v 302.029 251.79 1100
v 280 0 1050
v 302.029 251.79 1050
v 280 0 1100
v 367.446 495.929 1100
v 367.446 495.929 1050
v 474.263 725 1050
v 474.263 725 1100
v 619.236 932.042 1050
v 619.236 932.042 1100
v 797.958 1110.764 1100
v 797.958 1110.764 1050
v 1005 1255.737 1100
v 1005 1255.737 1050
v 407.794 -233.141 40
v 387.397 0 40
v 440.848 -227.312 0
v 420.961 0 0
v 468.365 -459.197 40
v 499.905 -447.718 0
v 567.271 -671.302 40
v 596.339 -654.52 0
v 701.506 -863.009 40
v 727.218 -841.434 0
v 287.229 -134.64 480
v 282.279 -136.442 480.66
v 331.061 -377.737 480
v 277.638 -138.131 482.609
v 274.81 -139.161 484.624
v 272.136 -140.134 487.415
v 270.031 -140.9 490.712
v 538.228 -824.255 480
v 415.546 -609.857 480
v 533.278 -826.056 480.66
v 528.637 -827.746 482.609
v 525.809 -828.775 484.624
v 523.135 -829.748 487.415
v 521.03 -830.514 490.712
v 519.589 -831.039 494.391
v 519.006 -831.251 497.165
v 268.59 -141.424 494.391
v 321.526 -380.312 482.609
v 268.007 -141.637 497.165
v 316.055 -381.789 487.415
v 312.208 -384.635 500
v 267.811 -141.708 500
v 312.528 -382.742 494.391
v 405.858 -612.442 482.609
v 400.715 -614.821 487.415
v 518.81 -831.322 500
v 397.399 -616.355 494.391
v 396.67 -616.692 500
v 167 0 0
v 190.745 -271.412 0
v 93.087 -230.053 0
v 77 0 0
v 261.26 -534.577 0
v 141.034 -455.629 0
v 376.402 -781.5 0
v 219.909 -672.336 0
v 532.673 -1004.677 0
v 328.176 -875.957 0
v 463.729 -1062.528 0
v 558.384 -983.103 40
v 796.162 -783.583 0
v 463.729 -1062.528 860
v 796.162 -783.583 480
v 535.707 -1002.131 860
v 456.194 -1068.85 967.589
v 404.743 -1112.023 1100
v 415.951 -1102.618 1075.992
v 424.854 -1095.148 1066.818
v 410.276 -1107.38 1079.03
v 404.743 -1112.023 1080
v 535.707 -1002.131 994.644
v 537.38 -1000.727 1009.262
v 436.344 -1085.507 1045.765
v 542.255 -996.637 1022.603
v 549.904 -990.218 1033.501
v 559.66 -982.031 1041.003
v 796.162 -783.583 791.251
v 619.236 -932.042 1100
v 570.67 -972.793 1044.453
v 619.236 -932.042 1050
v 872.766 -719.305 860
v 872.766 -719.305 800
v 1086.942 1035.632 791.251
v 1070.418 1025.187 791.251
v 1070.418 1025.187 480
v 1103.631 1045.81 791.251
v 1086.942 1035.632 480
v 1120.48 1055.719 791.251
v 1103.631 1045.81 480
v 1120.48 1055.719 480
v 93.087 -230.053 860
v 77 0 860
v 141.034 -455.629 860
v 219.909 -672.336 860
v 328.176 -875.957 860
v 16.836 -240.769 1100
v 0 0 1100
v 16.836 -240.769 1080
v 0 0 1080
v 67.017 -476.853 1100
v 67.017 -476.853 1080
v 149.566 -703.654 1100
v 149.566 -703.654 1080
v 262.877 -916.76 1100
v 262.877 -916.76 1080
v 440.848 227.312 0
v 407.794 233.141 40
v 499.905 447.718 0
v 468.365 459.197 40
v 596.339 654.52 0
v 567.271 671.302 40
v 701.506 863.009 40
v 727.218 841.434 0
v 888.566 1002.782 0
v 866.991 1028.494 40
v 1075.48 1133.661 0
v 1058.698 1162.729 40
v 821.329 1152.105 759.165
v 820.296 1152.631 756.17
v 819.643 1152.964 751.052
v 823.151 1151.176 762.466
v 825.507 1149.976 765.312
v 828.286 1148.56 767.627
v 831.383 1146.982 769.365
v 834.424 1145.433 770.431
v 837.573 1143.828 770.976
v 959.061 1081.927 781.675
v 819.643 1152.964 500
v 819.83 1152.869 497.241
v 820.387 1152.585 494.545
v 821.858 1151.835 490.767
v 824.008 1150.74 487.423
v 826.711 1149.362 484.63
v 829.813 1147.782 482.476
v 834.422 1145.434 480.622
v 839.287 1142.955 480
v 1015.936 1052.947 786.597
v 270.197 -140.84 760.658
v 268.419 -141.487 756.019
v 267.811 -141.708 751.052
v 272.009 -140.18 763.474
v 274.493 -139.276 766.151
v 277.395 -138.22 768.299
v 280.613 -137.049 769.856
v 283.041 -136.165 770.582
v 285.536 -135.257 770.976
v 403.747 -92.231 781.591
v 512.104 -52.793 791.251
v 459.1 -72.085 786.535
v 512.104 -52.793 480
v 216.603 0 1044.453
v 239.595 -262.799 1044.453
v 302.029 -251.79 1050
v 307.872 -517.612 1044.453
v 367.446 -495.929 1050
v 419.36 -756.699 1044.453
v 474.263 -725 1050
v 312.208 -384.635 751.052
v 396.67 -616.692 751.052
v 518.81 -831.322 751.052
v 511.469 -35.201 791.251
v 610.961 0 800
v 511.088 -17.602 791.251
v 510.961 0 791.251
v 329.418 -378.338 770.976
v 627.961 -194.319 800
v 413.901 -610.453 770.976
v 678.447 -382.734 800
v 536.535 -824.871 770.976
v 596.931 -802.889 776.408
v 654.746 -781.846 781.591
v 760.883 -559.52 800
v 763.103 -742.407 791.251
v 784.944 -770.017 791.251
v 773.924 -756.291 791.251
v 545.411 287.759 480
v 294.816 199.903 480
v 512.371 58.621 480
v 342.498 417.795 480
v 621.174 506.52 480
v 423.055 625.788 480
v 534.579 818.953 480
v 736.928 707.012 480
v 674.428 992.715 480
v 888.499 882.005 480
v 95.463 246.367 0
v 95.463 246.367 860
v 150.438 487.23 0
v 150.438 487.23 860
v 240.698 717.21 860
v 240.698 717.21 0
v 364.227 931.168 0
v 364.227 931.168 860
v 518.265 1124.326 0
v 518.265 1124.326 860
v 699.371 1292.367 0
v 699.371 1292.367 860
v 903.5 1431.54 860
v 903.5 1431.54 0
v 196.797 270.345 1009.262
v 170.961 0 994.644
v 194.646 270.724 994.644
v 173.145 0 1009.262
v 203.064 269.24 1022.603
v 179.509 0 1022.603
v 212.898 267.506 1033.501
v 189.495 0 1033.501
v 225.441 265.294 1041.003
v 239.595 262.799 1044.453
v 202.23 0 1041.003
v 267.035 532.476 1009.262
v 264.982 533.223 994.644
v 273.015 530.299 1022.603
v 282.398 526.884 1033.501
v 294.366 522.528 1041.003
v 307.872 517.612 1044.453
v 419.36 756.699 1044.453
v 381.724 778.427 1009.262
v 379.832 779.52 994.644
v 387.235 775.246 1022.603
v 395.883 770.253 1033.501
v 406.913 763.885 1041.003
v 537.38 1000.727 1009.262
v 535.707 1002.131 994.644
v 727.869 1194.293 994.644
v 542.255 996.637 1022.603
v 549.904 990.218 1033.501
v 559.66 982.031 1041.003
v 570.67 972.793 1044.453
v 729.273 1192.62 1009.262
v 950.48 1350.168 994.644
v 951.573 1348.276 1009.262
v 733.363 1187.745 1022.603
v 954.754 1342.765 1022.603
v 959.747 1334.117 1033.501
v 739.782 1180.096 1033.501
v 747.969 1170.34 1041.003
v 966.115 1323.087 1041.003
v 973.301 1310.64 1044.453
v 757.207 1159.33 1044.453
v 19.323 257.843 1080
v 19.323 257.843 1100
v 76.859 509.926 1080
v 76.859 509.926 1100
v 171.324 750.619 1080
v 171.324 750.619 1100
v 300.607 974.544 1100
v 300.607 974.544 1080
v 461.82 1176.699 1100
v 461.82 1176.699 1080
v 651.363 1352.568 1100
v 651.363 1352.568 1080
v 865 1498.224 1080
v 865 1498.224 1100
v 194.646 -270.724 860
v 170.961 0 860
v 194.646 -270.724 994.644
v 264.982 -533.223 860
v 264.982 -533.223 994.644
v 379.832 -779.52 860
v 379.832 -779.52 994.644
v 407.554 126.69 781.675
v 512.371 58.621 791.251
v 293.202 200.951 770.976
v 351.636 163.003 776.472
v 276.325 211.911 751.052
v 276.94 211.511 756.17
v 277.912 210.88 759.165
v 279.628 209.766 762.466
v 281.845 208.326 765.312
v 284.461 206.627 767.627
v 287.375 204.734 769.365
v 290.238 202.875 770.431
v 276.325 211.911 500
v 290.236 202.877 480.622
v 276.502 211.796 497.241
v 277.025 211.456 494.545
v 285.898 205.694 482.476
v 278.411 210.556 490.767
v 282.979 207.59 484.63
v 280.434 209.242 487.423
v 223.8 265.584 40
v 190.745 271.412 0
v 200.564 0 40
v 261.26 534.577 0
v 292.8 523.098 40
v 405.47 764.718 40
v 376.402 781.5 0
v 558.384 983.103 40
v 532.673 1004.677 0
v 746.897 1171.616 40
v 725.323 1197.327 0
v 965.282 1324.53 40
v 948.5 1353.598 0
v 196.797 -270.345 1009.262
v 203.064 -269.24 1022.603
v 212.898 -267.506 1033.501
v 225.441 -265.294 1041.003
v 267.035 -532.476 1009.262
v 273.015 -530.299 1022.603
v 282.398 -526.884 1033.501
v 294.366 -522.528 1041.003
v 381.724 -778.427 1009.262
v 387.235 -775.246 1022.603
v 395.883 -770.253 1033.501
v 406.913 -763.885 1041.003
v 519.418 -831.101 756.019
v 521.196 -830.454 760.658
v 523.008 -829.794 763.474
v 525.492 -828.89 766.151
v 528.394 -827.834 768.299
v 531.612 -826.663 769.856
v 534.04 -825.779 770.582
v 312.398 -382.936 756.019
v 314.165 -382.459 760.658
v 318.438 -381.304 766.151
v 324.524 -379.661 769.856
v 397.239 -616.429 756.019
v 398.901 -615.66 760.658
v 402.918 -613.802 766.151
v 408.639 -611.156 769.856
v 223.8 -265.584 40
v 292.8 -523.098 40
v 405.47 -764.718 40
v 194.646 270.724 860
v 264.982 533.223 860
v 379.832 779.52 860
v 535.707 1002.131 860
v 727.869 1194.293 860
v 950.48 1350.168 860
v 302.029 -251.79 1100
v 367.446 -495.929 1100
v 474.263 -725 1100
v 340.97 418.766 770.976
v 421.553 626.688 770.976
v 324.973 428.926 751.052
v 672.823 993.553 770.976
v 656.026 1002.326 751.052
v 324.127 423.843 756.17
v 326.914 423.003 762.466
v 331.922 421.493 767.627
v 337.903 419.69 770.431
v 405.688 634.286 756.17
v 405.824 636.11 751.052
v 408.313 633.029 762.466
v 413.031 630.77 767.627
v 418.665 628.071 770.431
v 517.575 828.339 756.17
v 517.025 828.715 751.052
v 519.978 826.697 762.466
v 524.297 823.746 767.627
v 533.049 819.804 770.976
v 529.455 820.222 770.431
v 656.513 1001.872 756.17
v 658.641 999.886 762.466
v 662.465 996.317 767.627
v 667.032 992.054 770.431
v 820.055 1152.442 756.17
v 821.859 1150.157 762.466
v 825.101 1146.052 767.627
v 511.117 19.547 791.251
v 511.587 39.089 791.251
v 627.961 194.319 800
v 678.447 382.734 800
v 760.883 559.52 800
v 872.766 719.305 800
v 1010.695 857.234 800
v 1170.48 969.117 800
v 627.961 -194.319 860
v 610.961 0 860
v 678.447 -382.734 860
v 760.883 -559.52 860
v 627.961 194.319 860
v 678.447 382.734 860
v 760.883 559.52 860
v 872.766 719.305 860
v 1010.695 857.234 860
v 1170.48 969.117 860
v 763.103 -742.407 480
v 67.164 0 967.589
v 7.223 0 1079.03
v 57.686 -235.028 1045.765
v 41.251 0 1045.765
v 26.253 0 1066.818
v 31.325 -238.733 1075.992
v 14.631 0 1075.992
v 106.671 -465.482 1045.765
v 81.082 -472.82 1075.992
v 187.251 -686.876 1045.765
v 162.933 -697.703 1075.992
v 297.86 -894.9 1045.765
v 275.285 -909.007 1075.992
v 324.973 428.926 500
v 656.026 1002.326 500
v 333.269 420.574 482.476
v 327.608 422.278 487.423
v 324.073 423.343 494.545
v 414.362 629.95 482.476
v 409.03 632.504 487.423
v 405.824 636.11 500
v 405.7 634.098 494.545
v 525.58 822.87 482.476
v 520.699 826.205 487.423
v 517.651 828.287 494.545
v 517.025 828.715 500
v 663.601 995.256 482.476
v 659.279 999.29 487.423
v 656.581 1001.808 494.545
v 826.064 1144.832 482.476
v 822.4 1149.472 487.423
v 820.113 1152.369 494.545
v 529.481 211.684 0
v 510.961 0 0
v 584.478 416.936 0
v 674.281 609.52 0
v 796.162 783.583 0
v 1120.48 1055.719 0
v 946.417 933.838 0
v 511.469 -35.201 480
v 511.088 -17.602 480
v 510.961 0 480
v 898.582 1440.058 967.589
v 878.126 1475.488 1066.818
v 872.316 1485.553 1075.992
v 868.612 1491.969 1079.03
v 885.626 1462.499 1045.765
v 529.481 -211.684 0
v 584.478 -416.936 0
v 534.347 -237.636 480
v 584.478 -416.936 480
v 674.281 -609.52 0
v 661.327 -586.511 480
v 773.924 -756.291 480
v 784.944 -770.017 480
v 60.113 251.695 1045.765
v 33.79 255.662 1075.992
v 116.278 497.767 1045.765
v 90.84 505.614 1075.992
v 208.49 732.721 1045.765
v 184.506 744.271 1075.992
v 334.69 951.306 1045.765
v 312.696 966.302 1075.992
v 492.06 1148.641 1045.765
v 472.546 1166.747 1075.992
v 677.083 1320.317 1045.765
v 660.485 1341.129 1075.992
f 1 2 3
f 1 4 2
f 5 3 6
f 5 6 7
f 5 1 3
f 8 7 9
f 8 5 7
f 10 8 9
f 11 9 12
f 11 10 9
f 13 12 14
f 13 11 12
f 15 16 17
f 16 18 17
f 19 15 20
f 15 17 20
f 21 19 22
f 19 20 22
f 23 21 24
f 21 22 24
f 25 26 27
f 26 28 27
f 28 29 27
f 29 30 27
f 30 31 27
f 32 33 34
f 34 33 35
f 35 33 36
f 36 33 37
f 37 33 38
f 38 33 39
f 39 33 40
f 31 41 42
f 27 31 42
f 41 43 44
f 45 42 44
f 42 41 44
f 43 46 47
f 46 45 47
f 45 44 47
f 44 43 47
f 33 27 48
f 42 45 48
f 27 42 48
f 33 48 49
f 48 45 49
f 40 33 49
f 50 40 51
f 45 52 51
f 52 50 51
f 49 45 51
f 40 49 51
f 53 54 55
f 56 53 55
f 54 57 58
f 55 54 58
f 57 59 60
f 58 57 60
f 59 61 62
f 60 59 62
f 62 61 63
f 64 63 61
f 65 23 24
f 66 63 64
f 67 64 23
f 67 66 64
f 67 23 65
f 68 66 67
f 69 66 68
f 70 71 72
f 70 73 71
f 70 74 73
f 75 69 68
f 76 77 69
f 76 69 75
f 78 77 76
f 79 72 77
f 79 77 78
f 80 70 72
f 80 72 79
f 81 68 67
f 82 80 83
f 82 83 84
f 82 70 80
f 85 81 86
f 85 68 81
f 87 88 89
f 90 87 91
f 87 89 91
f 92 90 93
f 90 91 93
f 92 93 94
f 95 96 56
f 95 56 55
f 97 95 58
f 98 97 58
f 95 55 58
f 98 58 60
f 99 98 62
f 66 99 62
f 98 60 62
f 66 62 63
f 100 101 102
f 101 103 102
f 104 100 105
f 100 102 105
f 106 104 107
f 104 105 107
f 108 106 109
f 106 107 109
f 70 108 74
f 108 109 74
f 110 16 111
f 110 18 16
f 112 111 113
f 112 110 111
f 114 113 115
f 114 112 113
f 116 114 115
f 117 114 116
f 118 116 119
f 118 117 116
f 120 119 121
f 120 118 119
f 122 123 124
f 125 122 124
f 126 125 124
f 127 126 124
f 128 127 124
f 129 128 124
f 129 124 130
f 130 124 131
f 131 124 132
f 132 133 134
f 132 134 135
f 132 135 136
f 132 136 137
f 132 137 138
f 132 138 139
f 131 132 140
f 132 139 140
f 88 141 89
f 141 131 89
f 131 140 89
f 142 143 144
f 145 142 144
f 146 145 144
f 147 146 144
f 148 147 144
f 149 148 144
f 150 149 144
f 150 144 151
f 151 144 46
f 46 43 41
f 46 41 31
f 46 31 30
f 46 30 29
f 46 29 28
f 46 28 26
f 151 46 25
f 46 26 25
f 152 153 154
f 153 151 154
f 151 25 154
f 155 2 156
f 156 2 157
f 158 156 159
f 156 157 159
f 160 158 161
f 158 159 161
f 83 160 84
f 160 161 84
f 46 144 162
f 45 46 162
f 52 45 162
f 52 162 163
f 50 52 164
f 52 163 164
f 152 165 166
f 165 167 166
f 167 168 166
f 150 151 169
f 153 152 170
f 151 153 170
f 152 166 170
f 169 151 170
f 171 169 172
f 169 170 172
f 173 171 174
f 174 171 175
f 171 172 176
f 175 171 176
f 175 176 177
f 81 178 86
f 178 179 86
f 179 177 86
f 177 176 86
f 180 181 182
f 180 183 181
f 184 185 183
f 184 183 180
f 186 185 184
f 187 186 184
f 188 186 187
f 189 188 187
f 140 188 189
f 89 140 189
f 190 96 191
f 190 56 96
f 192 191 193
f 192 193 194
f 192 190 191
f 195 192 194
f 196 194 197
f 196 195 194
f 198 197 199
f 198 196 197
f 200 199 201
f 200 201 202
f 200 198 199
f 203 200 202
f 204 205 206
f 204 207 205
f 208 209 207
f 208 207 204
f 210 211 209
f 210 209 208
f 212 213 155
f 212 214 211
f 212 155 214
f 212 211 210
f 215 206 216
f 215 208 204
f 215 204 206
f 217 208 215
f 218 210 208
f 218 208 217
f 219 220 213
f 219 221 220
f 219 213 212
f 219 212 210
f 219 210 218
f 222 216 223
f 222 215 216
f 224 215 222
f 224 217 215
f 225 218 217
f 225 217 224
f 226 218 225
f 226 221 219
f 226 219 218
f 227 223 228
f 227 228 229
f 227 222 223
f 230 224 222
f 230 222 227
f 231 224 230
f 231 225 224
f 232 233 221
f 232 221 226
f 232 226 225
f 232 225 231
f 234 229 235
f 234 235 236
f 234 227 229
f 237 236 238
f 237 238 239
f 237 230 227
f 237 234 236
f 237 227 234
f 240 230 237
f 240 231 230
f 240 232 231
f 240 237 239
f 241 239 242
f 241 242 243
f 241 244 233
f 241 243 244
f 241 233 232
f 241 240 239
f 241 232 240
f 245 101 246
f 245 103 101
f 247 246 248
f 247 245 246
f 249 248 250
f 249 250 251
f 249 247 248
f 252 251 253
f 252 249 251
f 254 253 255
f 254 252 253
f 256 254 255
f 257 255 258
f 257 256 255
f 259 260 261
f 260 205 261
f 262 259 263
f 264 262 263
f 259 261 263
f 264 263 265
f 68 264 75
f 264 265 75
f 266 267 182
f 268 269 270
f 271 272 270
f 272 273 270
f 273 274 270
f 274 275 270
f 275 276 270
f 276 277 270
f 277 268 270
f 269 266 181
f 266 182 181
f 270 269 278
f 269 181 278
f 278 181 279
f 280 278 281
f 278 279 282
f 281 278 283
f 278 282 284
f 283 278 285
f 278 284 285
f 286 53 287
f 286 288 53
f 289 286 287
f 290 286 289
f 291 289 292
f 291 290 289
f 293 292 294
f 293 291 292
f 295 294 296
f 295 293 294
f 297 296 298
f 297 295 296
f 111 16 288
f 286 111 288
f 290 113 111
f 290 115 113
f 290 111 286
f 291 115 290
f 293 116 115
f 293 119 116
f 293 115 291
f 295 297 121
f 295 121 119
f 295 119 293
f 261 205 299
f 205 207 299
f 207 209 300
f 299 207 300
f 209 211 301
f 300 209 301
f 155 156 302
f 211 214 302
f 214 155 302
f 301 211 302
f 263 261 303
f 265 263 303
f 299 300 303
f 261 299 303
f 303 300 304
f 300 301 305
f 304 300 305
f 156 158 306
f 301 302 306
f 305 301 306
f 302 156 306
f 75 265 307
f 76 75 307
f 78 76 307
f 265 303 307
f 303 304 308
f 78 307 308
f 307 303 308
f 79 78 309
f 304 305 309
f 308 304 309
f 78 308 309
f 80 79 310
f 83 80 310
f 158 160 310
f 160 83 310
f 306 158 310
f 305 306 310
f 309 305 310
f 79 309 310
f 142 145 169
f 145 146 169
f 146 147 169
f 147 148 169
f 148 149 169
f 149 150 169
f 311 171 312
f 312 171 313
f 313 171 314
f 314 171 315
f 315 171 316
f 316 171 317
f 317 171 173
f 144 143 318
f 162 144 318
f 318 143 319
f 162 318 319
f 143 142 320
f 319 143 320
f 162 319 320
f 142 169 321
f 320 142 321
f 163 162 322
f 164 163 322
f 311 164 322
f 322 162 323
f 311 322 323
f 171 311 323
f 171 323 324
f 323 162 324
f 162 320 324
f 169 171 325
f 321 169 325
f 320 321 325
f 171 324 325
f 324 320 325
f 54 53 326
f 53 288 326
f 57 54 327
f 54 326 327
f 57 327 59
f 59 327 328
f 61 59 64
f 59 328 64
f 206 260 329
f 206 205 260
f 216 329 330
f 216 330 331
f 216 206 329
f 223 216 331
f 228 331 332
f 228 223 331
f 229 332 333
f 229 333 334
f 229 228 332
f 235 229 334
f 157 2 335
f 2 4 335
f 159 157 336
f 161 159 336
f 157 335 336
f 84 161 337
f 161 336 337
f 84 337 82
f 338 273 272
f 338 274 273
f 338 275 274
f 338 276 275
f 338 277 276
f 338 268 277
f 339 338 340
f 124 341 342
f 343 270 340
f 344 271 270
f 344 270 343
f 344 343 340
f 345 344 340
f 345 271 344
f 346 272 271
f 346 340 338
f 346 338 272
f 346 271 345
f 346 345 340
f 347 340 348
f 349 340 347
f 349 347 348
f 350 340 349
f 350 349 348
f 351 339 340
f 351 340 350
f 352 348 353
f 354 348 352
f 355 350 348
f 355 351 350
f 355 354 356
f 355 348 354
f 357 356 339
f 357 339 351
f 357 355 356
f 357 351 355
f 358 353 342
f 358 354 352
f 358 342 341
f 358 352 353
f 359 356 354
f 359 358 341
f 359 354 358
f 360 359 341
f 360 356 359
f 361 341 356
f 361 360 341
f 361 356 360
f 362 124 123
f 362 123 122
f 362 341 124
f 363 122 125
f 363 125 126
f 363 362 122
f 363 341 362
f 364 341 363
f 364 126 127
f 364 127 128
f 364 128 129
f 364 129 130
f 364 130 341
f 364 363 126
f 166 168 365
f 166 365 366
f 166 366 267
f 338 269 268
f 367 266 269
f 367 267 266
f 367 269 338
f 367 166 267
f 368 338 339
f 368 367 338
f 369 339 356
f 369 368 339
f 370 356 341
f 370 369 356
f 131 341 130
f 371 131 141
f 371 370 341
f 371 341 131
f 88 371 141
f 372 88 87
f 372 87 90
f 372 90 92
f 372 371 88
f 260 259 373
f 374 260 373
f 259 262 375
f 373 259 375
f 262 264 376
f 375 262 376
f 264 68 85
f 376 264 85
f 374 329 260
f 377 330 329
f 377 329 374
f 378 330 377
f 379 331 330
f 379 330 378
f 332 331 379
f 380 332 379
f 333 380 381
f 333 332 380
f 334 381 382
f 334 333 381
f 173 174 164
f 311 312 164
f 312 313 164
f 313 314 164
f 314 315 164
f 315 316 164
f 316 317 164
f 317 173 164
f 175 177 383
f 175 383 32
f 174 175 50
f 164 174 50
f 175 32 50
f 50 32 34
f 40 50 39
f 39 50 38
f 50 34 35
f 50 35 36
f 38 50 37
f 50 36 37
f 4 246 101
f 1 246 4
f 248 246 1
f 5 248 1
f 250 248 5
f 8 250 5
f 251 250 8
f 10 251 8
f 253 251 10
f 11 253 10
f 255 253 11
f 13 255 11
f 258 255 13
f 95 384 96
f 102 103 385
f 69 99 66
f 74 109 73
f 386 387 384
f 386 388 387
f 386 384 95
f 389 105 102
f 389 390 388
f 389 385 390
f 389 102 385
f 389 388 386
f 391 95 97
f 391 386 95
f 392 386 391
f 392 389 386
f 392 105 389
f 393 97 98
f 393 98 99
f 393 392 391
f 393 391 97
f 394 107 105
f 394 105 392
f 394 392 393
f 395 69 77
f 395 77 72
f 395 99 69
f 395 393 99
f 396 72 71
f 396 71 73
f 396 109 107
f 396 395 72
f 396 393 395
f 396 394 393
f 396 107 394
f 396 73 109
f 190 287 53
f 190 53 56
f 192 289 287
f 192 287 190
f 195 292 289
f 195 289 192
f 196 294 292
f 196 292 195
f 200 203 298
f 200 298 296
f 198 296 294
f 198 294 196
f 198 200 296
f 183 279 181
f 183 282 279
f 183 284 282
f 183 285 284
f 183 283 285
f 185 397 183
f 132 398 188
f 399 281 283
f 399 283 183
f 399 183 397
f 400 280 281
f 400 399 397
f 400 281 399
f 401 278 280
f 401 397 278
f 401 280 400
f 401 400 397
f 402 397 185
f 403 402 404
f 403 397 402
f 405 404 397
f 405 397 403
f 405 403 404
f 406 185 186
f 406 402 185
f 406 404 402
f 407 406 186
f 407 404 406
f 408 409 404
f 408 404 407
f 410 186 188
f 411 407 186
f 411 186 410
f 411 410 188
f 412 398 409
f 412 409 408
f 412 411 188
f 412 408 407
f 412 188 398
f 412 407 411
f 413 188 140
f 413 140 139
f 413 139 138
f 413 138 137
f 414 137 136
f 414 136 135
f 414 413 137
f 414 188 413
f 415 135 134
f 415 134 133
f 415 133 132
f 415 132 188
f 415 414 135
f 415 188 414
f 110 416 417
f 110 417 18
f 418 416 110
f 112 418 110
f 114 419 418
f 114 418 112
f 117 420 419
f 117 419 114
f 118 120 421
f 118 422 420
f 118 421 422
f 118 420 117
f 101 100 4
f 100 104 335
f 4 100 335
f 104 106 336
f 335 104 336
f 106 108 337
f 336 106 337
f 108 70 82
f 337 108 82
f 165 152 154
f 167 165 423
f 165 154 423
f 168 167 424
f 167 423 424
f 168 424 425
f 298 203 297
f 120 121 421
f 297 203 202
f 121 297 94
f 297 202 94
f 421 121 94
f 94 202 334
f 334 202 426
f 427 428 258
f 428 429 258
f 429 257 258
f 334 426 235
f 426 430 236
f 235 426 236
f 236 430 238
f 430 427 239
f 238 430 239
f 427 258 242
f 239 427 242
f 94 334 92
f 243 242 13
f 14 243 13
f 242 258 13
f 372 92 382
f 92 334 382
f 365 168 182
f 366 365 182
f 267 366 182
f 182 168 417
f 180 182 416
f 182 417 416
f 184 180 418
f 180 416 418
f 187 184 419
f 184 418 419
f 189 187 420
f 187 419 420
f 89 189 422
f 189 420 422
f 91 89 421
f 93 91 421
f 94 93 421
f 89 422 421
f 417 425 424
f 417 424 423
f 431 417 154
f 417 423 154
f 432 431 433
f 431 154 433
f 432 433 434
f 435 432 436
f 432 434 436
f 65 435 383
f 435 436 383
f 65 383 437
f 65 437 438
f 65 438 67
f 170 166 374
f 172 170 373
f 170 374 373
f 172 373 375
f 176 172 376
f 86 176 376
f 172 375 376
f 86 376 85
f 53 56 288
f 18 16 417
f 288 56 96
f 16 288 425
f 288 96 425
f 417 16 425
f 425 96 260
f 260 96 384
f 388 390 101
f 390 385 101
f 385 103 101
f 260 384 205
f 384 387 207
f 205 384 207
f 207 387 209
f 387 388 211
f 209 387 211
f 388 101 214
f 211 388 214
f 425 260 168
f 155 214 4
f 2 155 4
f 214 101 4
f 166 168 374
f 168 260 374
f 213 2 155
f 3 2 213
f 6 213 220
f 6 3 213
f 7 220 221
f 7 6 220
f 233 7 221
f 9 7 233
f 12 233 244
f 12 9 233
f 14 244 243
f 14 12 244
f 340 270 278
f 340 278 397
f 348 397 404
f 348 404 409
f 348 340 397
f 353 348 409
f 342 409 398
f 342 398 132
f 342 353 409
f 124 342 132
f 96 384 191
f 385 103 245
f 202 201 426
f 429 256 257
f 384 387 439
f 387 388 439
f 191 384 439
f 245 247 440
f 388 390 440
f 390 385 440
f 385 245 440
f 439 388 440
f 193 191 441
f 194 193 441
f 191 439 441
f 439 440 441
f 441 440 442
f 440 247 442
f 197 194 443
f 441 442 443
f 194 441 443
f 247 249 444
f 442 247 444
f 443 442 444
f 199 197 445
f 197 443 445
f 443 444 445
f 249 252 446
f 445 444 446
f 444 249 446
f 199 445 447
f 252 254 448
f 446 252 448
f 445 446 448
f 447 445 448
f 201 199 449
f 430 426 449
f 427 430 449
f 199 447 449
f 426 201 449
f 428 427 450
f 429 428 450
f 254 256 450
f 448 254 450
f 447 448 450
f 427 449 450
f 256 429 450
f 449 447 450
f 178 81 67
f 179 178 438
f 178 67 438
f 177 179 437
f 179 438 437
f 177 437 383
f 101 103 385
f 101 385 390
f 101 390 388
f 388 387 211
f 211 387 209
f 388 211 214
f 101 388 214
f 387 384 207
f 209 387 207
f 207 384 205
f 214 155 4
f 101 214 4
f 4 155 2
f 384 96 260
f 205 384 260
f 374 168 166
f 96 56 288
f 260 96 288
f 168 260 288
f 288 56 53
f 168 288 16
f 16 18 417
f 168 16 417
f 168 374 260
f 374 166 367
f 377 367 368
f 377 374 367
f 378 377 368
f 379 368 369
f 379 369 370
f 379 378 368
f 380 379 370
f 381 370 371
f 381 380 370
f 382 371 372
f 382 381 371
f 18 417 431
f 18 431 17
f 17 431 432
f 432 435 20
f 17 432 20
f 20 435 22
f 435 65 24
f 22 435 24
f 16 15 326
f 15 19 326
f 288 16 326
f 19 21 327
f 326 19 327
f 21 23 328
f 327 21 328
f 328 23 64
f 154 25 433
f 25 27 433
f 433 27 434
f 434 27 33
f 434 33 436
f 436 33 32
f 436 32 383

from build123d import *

# Parameters (mm, degrees)
F2_ANGLE = 60
F5_DEPTH = 311.2511336474
F6_ANGLE = 40
F8_DEPTH = 311.2511336474


with BuildPart() as f2:
    # F0 (on Front) → F2 (revolve)
    with BuildSketch(Plane.XZ):
        with BuildLine():
            Line((77, 860), (77, 0))
            Line((77, 0), (167, 0))
            Line((167, 0), (200.5639852471, 40))
            Line((200.5639852471, 40), (387.3966058859, 40))
            Line((387.3966058859, 40), (420.960591133, 0))
            Line((420.960591133, 0), (510.960591133, 0))
            Line((510.960591133, 0), (510.960591133, 480))
            Line((510.960591133, 480), (280.960591133, 480))
            ThreePointArc((280.960591133, 480), (266.8184555093, 485.8578643763), (260.960591133, 500))
            Line((260.960591133, 500), (260.960591133, 751.0523442856))
            ThreePointArc((260.960591133, 751.0523442856), (266.2150443968, 764.5641484379), (279.2174762781, 770.9762382474))
            Line((279.2174762781, 770.9762382474), (610.960591133, 800))
            Line((610.960591133, 800), (610.960591133, 860))
            Line((610.960591133, 860), (170.960591133, 860))
            Line((170.960591133, 860), (170.960591133, 994.6437291457))
            ThreePointArc((170.960591133, 994.6437291457), (184.0967242925, 1028.4232395265), (216.6028039956, 1044.4534640503))
            Line((216.6028039956, 1044.4534640503), (280, 1050))
            Line((280, 1050), (280, 1100))
            Line((280, 1100), (0, 1100))
            Line((0, 1100), (0, 1080))
            add(Edge.make_bspline(
                [(77, 860), (77, 1080), (0, 1080)],
                knots=[4.7123889804, 4.7123889804, 4.7123889804, 6.2831853072, 6.2831853072, 6.2831853072], degree=2, weights=[1, 0.7071067812, 1]))
        make_face()
    revolve(axis=Axis((1730, 0, 0), (0, 0, -1)), revolution_arc=F2_ANGLE)

    # F4 (on face) → F5 (join, through all)
    with BuildSketch(Plane.XY.offset(480)):
        with BuildLine():
            ThreePointArc((510.960591133, 0), (511.3132112784, 29.3187886209), (512.3708677163, 58.6206156975))
            Line((512.3708677163, 58.6206156975), (276.3251008291, 211.9105290561))
            ThreePointArc((276.3251008291, 211.9105290561), (264.8067534678, 106.2333992714), (260.960591133, 0))
            Line((260.960591133, 0), (510.960591133, 0))
        make_face()
        with BuildLine():
            Line((819.6426489226, 1152.9641269977), (1070.4184914786, 1025.187453097))
            ThreePointArc((1070.4184914786, 1025.187453097), (1095.2657898853, 1040.7543239789), (1120.4802955665, 1055.7190962932))
            Line((1120.4802955665, 1055.7190962932), (995.4802955665, 1272.2254472393))
            ThreePointArc((995.4802955665, 1272.2254472393), (905.4025542345, 1215.7778733146), (819.6426489226, 1152.9641269977))
        make_face()
    extrude(amount=F5_DEPTH)


with BuildPart() as f6:
    # F0 (on Front) → F6 (revolve)
    with BuildSketch(Plane.XZ):
        with BuildLine():
            Line((77, 860), (77, 0))
            Line((77, 0), (167, 0))
            Line((167, 0), (200.5639852471, 40))
            Line((200.5639852471, 40), (387.3966058859, 40))
            Line((387.3966058859, 40), (420.960591133, 0))
            Line((420.960591133, 0), (510.960591133, 0))
            Line((510.960591133, 0), (510.960591133, 480))
            Line((510.960591133, 480), (280.960591133, 480))
            ThreePointArc((280.960591133, 480), (266.8184555093, 485.8578643763), (260.960591133, 500))
            Line((260.960591133, 500), (260.960591133, 751.0523442856))
            ThreePointArc((260.960591133, 751.0523442856), (266.2150443968, 764.5641484379), (279.2174762781, 770.9762382474))
            Line((279.2174762781, 770.9762382474), (610.960591133, 800))
            Line((610.960591133, 800), (610.960591133, 860))
            Line((610.960591133, 860), (170.960591133, 860))
            Line((170.960591133, 860), (170.960591133, 994.6437291457))
            ThreePointArc((170.960591133, 994.6437291457), (184.0967242925, 1028.4232395265), (216.6028039956, 1044.4534640503))
            Line((216.6028039956, 1044.4534640503), (280, 1050))
            Line((280, 1050), (280, 1100))
            Line((280, 1100), (0, 1100))
            Line((0, 1100), (0, 1080))
            add(Edge.make_bspline(
                [(77, 860), (77, 1080), (0, 1080)],
                knots=[4.7123889804, 4.7123889804, 4.7123889804, 6.2831853072, 6.2831853072, 6.2831853072], degree=2, weights=[1, 0.7071067812, 1]))
        make_face()
    revolve(axis=Axis((1730, 0, 0), (0, 0, 1)), revolution_arc=F6_ANGLE)

    # F7 (on face) → F8 (join, through all)
    with BuildSketch(Plane.XY.offset(480)):
        with BuildLine():
            ThreePointArc((518.8103838976, -831.3221389148), (560.36603147, -888.838098005), (604.6505241146, -944.2803301609))
            Line((604.6505241146, -944.2803301609), (796.1616348944, -783.5834277393))
            ThreePointArc((796.1616348944, -783.5834277393), (779.4094834165, -763.1741283301), (763.1032953401, -742.4067907075))
            Line((763.1032953401, -742.4067907075), (518.8103838976, -831.3221389148))
        make_face()
        with BuildLine():
            Line((267.8113544688, -141.7079732541), (512.1042659113, -52.7926250468))
            ThreePointArc((512.1042659113, -52.7926250468), (511.2465433657, -26.4025058059), (510.960591133, 0))
            Line((510.960591133, 0), (260.960591133, 0))
            ThreePointArc((260.960591133, 0), (262.6742815095, -70.9367370304), (267.8113544688, -141.7079732541))
        make_face()
    extrude(amount=F8_DEPTH)


solid = Compound([f2.part, f6.part])
